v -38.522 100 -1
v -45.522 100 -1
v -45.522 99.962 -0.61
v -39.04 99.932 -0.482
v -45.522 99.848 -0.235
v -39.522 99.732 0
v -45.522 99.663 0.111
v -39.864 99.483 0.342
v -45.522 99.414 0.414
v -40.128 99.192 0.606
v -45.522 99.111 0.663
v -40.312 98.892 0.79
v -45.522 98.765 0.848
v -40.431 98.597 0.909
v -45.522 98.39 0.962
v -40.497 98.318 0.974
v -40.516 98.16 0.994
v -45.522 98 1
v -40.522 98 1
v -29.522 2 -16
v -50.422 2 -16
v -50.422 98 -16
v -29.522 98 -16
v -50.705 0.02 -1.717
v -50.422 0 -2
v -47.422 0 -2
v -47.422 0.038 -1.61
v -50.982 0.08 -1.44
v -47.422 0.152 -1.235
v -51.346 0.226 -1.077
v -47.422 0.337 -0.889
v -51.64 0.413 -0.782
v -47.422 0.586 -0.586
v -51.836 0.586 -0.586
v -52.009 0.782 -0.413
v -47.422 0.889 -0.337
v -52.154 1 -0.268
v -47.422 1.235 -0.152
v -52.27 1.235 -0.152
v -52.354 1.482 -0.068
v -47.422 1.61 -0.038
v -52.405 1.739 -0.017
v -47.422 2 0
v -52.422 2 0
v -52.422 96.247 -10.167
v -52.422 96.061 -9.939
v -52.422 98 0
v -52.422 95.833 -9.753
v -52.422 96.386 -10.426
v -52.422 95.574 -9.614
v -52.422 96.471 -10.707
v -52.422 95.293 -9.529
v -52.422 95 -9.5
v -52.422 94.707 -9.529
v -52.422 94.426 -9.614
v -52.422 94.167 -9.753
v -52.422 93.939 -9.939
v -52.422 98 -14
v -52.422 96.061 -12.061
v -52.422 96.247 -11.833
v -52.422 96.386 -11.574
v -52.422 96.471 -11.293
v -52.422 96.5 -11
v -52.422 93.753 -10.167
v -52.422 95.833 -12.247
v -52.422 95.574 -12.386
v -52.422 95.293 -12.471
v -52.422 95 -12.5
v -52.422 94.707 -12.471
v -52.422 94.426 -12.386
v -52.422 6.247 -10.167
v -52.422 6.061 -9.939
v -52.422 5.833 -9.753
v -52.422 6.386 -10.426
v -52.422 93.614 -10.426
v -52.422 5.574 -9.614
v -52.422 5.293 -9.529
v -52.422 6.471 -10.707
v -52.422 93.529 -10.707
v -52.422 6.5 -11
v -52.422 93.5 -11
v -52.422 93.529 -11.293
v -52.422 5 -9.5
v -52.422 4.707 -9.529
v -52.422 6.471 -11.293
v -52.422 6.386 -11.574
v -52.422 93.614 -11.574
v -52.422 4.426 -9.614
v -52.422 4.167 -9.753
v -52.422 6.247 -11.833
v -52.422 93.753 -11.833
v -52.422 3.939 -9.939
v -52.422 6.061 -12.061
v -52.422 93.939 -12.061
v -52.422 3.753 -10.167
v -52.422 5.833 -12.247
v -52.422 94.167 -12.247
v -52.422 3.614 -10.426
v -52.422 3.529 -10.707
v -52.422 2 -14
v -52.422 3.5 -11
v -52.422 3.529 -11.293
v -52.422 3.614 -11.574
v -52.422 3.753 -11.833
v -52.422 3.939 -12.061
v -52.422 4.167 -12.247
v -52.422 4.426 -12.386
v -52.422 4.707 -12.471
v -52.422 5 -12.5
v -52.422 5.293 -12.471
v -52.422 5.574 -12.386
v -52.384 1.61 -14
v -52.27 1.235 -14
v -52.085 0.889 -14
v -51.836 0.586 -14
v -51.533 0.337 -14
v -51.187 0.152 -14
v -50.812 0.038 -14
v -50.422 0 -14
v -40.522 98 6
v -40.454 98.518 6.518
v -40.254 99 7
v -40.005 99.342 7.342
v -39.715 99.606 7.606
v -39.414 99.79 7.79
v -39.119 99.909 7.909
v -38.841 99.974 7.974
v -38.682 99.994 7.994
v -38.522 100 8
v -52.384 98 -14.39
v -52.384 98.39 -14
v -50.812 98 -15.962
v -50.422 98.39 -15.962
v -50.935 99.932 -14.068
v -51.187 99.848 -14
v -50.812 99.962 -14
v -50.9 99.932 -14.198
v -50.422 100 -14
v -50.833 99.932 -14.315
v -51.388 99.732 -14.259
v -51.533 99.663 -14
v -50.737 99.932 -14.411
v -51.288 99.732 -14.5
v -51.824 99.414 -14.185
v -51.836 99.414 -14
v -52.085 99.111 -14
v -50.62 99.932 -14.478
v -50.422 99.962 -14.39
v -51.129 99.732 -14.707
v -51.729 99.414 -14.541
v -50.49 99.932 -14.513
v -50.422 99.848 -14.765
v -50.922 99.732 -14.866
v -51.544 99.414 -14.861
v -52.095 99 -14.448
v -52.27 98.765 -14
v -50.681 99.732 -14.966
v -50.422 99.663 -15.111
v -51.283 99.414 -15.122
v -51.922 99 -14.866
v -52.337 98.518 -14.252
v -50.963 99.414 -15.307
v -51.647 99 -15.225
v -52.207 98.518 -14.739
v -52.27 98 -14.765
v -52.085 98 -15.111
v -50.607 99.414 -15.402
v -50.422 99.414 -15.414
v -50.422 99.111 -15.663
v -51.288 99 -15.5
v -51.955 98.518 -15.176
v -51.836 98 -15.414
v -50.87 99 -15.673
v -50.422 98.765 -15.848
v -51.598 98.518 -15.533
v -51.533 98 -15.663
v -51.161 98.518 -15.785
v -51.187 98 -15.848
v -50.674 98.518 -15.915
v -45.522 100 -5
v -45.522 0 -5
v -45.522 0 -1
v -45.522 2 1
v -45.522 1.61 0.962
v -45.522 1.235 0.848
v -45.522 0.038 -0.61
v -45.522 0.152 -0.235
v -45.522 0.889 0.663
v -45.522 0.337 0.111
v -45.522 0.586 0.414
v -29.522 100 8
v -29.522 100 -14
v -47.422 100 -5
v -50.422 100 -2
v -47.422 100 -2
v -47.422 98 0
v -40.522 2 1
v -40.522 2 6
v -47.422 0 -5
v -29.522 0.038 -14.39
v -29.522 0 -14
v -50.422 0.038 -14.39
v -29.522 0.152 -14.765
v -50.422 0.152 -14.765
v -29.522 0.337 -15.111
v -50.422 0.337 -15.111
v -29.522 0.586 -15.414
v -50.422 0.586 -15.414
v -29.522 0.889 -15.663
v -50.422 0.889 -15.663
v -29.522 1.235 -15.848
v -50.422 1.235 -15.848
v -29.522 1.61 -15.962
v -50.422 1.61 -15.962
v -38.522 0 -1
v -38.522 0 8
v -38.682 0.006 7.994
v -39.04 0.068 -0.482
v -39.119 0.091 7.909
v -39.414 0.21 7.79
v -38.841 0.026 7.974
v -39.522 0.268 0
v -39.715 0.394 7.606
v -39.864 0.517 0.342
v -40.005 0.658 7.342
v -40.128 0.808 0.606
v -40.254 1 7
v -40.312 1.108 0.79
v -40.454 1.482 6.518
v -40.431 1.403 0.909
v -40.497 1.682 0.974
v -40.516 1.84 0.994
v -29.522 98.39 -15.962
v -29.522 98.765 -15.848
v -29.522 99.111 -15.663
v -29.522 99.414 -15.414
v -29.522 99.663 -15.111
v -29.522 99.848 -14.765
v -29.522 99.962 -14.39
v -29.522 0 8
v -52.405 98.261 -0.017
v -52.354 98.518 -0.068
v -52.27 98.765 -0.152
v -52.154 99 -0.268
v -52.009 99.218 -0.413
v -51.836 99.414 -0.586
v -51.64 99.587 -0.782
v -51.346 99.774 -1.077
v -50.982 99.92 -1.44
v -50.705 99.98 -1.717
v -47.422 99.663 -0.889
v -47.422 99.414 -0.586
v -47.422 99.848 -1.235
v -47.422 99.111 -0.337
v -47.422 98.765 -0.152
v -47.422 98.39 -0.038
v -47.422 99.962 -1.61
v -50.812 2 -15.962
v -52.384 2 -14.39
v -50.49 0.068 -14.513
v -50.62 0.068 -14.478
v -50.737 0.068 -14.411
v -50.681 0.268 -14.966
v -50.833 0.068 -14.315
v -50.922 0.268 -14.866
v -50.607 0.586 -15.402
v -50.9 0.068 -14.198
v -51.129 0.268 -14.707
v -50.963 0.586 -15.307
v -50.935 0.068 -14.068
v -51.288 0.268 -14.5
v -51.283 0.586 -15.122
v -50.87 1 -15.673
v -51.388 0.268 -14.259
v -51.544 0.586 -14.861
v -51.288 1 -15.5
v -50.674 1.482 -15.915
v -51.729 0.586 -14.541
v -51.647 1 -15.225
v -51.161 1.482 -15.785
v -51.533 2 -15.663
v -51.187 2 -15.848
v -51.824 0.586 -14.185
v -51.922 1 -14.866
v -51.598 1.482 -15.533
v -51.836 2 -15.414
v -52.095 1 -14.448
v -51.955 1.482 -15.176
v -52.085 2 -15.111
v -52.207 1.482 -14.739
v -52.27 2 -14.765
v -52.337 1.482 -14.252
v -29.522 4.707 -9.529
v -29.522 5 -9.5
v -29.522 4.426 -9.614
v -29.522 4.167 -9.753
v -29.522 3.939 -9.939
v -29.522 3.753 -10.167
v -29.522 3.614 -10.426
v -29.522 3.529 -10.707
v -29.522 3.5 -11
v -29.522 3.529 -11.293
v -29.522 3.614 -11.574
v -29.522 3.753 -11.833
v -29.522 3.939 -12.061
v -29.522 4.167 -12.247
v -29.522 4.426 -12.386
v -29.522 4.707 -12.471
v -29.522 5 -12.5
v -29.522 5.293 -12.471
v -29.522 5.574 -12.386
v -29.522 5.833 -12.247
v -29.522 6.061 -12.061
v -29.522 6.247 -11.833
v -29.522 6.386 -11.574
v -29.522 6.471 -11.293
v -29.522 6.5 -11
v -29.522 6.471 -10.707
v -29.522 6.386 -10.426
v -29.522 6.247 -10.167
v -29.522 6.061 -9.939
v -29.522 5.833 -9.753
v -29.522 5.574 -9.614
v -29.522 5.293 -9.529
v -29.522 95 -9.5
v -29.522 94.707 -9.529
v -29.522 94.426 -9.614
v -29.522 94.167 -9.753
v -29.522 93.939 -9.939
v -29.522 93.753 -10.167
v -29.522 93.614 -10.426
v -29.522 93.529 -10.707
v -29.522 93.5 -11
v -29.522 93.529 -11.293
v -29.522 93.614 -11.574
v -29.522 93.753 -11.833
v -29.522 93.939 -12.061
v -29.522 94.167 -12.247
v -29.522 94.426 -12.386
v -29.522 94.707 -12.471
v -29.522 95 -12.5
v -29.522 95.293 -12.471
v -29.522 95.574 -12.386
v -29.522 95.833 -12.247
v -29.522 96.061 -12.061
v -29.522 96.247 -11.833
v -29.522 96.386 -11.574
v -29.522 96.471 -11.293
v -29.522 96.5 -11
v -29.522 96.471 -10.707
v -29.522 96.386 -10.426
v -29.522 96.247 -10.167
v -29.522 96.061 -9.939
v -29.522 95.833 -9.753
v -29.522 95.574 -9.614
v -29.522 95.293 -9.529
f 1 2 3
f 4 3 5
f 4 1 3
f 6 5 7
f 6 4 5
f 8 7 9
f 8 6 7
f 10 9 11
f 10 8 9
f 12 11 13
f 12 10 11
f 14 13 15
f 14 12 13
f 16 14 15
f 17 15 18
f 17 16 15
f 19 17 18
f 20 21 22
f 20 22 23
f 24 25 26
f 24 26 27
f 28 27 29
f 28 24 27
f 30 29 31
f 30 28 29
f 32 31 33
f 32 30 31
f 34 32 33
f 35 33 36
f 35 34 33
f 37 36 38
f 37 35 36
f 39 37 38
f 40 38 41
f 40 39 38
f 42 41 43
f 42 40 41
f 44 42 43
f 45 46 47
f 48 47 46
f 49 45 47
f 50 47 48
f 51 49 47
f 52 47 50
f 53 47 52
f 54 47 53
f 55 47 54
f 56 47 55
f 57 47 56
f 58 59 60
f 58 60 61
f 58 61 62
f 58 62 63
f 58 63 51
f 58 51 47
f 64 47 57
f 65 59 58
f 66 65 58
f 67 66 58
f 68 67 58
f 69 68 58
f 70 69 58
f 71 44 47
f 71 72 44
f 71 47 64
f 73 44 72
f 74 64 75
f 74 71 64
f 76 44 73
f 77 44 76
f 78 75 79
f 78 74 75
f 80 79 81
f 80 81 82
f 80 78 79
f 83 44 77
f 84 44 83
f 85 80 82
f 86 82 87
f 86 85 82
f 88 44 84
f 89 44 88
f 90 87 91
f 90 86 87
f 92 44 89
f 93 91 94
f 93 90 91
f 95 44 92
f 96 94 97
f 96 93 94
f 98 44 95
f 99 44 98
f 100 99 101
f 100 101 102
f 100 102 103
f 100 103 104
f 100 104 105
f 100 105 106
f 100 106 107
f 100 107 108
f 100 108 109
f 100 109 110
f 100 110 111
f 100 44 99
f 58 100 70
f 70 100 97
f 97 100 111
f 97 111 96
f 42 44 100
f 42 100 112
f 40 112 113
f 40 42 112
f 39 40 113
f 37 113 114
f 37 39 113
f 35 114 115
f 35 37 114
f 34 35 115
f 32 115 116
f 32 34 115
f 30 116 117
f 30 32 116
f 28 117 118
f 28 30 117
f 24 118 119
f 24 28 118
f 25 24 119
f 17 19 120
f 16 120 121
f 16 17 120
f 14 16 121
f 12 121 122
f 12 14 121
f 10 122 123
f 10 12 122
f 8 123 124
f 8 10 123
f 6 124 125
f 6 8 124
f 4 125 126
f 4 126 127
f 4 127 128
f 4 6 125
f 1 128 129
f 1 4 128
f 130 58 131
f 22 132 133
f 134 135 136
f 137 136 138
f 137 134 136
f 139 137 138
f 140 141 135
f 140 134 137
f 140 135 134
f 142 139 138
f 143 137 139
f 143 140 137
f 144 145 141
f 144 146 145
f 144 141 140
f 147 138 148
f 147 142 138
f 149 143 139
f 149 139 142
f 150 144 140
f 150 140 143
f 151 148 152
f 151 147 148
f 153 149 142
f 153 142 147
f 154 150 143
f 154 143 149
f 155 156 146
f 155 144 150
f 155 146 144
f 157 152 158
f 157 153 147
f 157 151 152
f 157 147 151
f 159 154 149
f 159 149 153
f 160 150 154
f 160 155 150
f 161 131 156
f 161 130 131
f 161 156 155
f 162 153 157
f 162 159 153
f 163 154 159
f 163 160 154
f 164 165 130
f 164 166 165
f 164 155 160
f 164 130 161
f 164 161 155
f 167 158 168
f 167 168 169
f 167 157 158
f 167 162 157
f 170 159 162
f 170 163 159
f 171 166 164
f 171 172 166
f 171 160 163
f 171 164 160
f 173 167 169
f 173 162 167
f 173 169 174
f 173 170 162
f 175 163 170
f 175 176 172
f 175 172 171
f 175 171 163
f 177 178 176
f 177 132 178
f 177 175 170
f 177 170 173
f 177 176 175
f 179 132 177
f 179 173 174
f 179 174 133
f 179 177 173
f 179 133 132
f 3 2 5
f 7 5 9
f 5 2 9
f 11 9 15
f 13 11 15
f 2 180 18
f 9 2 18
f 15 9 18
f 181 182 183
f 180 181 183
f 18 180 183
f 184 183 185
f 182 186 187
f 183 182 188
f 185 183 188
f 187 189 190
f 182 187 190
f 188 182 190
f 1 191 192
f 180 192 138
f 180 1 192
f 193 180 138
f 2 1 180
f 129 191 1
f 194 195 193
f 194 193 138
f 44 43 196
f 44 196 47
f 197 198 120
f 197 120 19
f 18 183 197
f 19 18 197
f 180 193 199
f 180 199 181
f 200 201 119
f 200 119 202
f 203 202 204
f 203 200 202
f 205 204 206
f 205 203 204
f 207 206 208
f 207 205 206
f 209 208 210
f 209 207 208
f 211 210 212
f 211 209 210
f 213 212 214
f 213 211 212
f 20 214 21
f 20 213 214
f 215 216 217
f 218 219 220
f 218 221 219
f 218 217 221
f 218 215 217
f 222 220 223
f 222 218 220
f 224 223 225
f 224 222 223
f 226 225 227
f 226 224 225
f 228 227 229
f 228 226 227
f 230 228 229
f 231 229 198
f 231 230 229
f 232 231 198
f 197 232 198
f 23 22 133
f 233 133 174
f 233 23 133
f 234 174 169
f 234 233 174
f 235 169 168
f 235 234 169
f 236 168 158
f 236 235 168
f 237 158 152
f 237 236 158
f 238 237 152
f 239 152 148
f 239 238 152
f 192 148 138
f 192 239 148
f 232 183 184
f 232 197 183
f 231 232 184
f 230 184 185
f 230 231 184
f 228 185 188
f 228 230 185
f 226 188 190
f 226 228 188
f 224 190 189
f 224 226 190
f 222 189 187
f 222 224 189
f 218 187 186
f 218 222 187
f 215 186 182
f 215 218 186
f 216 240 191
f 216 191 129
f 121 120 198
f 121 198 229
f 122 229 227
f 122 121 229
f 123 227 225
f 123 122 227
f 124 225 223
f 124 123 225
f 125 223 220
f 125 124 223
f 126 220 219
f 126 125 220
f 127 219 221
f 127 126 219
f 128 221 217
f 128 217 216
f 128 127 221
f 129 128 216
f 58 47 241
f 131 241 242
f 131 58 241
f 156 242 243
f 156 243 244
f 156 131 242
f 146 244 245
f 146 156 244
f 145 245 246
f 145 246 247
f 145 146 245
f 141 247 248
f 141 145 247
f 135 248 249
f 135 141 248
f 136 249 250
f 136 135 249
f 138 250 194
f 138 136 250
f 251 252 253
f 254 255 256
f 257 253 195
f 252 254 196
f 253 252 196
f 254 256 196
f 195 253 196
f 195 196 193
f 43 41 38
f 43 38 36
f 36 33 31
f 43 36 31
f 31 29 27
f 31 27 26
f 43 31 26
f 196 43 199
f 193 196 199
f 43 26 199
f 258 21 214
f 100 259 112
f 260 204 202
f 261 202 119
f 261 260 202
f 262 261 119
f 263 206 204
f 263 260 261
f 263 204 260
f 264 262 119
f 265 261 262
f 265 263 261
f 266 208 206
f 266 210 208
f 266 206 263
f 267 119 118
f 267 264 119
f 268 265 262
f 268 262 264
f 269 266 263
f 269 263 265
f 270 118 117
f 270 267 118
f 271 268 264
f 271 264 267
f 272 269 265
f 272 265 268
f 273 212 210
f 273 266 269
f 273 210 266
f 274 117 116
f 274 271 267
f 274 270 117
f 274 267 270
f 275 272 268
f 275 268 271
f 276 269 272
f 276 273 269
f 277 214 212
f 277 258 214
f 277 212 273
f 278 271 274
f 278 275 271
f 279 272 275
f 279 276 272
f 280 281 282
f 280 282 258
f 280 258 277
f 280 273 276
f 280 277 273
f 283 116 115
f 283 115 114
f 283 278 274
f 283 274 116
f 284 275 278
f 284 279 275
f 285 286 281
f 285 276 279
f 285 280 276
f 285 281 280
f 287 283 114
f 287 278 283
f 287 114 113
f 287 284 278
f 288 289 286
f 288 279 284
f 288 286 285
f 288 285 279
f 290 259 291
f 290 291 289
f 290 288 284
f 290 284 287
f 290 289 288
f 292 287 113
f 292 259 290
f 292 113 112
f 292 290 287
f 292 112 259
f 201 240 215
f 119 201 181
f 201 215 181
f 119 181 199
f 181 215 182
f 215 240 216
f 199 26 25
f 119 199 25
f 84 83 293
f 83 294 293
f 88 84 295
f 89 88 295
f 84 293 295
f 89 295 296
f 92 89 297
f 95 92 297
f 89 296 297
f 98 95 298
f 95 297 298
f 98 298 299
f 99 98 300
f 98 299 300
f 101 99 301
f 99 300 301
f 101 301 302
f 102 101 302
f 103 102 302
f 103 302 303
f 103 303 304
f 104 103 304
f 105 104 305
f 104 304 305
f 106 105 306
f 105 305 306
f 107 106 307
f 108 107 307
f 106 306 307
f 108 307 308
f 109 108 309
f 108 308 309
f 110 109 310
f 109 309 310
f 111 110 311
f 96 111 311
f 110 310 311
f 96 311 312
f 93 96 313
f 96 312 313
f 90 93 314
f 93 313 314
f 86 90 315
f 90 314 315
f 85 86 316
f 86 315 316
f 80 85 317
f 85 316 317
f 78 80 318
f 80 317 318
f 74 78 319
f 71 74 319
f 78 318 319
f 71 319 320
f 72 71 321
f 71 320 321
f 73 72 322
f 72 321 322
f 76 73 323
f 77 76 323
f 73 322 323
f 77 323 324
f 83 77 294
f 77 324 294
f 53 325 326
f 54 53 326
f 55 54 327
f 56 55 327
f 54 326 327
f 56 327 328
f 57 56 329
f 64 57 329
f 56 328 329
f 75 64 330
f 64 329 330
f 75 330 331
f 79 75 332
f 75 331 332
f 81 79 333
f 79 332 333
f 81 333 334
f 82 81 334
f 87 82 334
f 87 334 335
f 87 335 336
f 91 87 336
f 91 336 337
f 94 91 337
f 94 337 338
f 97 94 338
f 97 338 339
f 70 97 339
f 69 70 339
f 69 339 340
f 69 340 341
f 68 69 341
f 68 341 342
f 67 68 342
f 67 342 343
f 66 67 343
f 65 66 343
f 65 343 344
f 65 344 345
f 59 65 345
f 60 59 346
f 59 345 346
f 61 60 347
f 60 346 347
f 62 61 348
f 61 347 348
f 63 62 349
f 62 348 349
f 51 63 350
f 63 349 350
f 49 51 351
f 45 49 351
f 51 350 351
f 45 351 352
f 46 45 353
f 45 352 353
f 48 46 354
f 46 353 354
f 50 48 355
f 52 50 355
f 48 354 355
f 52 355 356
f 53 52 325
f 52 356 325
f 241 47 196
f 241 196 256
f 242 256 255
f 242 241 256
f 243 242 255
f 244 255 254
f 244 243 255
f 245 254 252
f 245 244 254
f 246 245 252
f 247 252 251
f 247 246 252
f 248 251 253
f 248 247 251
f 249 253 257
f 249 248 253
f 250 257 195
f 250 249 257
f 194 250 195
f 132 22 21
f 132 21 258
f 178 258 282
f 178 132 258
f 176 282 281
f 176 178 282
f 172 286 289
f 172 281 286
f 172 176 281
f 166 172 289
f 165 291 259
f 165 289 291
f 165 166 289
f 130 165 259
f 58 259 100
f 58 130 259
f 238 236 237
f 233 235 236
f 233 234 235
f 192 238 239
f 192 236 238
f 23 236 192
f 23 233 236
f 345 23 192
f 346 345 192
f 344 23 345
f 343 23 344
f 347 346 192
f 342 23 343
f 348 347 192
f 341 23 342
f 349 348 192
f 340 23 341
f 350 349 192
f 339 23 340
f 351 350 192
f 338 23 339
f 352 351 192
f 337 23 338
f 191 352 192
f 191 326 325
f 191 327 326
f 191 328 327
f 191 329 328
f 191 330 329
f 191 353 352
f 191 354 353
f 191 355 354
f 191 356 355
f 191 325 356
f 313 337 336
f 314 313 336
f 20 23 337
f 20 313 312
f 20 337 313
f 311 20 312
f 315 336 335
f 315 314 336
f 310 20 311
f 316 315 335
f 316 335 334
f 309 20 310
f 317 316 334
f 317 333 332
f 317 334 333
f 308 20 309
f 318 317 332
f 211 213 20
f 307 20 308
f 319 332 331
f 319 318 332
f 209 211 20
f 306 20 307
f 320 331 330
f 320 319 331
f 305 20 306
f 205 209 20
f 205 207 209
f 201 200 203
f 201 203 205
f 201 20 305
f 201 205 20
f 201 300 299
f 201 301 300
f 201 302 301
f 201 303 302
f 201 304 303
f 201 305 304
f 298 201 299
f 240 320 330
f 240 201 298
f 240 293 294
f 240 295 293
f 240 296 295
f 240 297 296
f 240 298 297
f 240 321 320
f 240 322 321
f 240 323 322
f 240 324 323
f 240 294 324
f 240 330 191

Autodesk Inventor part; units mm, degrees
ref_plane "YZ Plane" through (0, 0, 0) normal (1, 0, 0) x (0, 1, 0)
ref_plane "XZ Plane" through (0, 0, 0) normal (0, 1, 0) x (-1, 0, 0)
ref_plane "XY Plane" through (0, 0, 0) normal (0, 0, 1) x (1, 0, 0)
sketch "Sketch1" plane through (0, 0, 0) normal (0, 1, 0) x (-1, 0, 0)
  line L0 (47.4221, 0) -> (47.4221, -5)
  line L1 (47.4221, -5) -> (45.5221, -5)
  line L2 (45.5221, -5) -> (45.5221, 1)
  line L3 (47.4221, 0) -> (52.4221, 0)
  line L4 (52.4221, 0) -> (52.4221, -12)
  line L5 (52.4221, -12) -> (29.5221, -12)
  line L6 (45.5221, 1) -> (40.5221, 1)
  line L7 (29.5221, -12) -> (29.5221, 8)
  line L8 (29.5221, 8) -> (40.5221, 8)
  line L9 (40.5221, 8) -> (40.5221, 1)
  line L10 (47.4221, -5) -> (52.4221, -5)
  line L11 (52.4221, -5) -> (52.4221, -16)
  line L12 (52.4221, -16) -> (29.5221, -16)
  line L13 (29.5221, -16) -> (29.5221, -12)
  point P0 (0, 0)
  dimension "d0" = 5
  dimension "d1" = 1.9
  dimension "d2" = 6
  dimension "d4" = 5
  dimension "d5" = 12
  dimension "d6" = 5
  dimension "d7" = 20
  dimension "d8" = 11
  dimension "d9" = 7
  dimension "d10" = 11
extrude "Extrusion1" add sketch "Sketch1" along normal blind 100
sketch "Sketch2" plane through (-52.4221, 0, -16) normal (-1, 0, 0) x (0, 0, 1)
  line L0 (0, 0) -> (0, 100) projected
  line L1 (0, 0) -> (5, 0)
  line L2 (24, 0) -> (0, 0) projected
  line L3 (5, 0) -> (5, 5)
  circle A0 centre (5, 5) radius 1.5
  line L4 (0, 100) -> (5, 100)
  line L5 (24, 100) -> (0, 100) projected
  line L6 (5, 100) -> (5, 95)
  circle A1 centre (5, 95) radius 1.5
  point P0 (16, 0)
  dimension "d13" = 5
  dimension "d14" = 5
  dimension "d15" = 3
  dimension "d16" = 5
  dimension "d17" = 5
  dimension "d18" = 3
hole "Hole1" at (-52.4221, 5, -11) at (-52.4221, 95, -11) direction (1, 0, 0) diameter 3 end through all
fillet "Fillet1" radius 2 12 edges at (-52.4221, 50, -16) (-52.4221, 0, -8) (-52.4221, 100, -8) (-40.9721, 100, -16) (-40.9721, 0, -16) (-40.5221, 50, 8) (-40.5221, 0, 4.5) (-43.0221, 0, 1) (-49.9221, 0, 0) (-49.9221, 100, 0) (-43.0221, 100, 1) (-40.5221, 100, 4.5)
properties part number "Wal Mount"
